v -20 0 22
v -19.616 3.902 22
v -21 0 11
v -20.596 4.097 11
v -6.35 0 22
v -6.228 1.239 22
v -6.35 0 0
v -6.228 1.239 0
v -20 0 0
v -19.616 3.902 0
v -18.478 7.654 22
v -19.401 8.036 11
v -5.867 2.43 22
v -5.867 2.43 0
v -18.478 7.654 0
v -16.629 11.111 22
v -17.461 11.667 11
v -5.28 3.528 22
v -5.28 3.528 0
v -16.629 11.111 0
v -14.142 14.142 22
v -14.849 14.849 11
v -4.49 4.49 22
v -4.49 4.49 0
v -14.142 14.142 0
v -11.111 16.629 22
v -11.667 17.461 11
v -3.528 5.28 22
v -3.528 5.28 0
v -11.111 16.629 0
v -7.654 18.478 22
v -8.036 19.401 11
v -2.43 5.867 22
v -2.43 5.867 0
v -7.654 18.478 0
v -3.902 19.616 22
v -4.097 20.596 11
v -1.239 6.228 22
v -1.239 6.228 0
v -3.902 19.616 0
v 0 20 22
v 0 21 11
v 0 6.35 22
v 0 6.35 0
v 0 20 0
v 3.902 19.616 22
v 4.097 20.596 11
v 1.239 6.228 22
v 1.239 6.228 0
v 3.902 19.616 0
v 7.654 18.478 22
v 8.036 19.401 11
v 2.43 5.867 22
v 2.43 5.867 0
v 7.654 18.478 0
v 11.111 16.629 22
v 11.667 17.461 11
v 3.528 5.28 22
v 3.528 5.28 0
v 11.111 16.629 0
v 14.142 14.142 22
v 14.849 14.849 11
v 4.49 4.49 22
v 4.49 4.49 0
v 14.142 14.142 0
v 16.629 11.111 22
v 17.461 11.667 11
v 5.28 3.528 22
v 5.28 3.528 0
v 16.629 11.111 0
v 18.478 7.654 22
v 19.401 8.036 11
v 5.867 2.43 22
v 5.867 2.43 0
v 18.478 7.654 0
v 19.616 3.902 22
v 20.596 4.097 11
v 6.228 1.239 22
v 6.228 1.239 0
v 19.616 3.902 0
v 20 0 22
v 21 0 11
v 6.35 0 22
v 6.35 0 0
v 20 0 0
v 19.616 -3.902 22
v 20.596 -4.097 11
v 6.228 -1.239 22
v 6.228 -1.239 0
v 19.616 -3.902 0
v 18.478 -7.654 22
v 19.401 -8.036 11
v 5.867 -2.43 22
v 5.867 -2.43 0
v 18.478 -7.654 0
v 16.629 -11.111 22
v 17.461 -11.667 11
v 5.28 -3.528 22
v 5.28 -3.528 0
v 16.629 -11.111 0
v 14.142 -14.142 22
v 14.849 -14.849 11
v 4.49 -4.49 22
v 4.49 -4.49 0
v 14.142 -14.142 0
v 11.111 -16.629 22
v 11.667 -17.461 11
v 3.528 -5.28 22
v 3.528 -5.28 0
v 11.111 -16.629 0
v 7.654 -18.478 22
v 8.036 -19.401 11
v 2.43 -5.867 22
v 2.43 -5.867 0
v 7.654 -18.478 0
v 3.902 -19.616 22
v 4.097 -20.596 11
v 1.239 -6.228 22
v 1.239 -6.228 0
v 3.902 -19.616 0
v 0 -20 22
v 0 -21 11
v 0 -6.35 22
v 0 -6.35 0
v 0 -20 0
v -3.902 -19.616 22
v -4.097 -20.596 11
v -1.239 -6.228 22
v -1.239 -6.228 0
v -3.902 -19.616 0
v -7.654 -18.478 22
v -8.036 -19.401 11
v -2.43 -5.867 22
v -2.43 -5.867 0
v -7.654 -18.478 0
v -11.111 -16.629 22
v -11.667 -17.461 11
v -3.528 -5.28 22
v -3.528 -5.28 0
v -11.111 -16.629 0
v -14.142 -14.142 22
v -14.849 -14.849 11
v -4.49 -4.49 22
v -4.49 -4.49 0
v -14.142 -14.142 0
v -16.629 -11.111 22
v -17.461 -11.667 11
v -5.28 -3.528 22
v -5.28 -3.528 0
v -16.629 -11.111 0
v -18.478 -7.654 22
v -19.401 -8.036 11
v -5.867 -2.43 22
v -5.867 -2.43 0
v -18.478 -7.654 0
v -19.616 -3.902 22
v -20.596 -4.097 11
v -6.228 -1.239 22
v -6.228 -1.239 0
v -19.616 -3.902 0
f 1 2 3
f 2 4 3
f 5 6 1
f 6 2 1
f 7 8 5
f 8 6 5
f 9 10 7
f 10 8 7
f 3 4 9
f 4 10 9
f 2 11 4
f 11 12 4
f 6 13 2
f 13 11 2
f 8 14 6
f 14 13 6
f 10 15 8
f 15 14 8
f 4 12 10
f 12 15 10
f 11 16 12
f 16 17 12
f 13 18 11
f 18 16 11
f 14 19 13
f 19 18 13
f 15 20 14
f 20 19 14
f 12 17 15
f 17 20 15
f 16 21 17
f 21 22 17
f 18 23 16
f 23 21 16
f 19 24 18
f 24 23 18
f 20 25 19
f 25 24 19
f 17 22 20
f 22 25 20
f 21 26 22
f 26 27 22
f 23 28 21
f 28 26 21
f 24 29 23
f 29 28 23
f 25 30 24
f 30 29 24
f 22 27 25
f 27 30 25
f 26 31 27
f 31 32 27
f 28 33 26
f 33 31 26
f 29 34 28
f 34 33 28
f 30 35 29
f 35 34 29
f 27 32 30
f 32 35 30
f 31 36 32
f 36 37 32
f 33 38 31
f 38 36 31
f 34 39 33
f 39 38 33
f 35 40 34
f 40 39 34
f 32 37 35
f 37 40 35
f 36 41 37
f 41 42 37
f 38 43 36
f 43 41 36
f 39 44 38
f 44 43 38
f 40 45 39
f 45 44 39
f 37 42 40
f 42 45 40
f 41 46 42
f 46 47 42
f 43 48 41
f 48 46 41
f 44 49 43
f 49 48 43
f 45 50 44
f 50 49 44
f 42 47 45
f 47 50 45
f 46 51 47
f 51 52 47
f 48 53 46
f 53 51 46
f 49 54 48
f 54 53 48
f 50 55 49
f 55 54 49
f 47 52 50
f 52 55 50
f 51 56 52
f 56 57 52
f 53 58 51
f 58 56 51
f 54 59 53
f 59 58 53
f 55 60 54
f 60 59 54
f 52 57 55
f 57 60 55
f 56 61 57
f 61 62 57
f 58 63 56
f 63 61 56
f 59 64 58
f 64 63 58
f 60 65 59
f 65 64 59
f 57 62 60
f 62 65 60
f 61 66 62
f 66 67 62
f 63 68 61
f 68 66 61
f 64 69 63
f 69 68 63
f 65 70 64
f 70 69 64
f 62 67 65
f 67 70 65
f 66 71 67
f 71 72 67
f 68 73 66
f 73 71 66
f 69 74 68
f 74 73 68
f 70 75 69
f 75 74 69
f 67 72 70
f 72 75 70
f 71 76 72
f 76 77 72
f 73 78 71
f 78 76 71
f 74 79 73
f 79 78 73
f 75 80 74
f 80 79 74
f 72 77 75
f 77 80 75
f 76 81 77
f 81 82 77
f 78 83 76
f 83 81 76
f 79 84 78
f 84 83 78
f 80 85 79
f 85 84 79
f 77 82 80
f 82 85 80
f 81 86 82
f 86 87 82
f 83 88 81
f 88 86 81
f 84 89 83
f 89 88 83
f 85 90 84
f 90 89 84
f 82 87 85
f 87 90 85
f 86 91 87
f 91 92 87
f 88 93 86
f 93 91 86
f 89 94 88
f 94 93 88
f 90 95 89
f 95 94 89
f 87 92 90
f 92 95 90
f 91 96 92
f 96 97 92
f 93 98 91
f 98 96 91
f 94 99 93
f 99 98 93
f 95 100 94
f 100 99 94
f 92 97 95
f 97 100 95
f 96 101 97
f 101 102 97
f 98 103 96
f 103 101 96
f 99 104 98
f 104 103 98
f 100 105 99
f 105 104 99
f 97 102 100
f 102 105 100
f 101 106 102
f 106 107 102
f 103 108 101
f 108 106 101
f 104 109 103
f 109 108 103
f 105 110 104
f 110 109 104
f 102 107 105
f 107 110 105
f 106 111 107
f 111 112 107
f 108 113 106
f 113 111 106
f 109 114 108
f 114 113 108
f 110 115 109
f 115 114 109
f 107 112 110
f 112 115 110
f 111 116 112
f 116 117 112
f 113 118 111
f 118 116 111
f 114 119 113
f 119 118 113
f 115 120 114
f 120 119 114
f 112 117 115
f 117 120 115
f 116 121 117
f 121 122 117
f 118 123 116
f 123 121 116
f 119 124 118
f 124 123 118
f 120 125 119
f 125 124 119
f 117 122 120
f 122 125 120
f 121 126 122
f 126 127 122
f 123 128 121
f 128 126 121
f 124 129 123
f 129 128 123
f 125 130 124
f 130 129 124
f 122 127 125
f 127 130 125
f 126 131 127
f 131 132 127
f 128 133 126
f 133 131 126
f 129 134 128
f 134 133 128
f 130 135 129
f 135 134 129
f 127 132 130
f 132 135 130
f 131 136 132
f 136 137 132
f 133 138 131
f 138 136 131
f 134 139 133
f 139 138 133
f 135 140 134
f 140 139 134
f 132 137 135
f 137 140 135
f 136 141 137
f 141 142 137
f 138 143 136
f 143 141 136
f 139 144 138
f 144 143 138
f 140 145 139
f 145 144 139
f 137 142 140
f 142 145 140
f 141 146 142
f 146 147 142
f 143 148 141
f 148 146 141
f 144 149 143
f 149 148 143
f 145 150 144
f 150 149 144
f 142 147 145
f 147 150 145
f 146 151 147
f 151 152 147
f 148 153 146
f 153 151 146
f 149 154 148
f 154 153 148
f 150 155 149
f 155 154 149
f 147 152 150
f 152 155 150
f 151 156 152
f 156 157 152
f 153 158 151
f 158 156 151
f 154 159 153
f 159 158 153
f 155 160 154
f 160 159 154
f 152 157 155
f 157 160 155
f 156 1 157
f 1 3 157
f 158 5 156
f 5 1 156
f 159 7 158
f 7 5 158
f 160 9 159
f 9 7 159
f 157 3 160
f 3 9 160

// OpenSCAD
$fn = 32;

// ----------------------------------------------------------------------
// Belt roller: 40 mm barrel, 22 mm wide, bore 12.7 mm
// ----------------------------------------------------------------------

// --- parameters (mm) ---
bore_d = 12.7;            // bore
barrel_d = 40;            // barrel diameter
roller_w = 22;            // roller width
crown = 1;                // crown height at mid width

roller_profile = [[6.35, 0], [20, 0], [21, 11], [20, 22], [6.35, 22]];

/* the profile stays clear of the axis, so the bore comes out of the revolve */
rotate_extrude() polygon(roller_profile);
